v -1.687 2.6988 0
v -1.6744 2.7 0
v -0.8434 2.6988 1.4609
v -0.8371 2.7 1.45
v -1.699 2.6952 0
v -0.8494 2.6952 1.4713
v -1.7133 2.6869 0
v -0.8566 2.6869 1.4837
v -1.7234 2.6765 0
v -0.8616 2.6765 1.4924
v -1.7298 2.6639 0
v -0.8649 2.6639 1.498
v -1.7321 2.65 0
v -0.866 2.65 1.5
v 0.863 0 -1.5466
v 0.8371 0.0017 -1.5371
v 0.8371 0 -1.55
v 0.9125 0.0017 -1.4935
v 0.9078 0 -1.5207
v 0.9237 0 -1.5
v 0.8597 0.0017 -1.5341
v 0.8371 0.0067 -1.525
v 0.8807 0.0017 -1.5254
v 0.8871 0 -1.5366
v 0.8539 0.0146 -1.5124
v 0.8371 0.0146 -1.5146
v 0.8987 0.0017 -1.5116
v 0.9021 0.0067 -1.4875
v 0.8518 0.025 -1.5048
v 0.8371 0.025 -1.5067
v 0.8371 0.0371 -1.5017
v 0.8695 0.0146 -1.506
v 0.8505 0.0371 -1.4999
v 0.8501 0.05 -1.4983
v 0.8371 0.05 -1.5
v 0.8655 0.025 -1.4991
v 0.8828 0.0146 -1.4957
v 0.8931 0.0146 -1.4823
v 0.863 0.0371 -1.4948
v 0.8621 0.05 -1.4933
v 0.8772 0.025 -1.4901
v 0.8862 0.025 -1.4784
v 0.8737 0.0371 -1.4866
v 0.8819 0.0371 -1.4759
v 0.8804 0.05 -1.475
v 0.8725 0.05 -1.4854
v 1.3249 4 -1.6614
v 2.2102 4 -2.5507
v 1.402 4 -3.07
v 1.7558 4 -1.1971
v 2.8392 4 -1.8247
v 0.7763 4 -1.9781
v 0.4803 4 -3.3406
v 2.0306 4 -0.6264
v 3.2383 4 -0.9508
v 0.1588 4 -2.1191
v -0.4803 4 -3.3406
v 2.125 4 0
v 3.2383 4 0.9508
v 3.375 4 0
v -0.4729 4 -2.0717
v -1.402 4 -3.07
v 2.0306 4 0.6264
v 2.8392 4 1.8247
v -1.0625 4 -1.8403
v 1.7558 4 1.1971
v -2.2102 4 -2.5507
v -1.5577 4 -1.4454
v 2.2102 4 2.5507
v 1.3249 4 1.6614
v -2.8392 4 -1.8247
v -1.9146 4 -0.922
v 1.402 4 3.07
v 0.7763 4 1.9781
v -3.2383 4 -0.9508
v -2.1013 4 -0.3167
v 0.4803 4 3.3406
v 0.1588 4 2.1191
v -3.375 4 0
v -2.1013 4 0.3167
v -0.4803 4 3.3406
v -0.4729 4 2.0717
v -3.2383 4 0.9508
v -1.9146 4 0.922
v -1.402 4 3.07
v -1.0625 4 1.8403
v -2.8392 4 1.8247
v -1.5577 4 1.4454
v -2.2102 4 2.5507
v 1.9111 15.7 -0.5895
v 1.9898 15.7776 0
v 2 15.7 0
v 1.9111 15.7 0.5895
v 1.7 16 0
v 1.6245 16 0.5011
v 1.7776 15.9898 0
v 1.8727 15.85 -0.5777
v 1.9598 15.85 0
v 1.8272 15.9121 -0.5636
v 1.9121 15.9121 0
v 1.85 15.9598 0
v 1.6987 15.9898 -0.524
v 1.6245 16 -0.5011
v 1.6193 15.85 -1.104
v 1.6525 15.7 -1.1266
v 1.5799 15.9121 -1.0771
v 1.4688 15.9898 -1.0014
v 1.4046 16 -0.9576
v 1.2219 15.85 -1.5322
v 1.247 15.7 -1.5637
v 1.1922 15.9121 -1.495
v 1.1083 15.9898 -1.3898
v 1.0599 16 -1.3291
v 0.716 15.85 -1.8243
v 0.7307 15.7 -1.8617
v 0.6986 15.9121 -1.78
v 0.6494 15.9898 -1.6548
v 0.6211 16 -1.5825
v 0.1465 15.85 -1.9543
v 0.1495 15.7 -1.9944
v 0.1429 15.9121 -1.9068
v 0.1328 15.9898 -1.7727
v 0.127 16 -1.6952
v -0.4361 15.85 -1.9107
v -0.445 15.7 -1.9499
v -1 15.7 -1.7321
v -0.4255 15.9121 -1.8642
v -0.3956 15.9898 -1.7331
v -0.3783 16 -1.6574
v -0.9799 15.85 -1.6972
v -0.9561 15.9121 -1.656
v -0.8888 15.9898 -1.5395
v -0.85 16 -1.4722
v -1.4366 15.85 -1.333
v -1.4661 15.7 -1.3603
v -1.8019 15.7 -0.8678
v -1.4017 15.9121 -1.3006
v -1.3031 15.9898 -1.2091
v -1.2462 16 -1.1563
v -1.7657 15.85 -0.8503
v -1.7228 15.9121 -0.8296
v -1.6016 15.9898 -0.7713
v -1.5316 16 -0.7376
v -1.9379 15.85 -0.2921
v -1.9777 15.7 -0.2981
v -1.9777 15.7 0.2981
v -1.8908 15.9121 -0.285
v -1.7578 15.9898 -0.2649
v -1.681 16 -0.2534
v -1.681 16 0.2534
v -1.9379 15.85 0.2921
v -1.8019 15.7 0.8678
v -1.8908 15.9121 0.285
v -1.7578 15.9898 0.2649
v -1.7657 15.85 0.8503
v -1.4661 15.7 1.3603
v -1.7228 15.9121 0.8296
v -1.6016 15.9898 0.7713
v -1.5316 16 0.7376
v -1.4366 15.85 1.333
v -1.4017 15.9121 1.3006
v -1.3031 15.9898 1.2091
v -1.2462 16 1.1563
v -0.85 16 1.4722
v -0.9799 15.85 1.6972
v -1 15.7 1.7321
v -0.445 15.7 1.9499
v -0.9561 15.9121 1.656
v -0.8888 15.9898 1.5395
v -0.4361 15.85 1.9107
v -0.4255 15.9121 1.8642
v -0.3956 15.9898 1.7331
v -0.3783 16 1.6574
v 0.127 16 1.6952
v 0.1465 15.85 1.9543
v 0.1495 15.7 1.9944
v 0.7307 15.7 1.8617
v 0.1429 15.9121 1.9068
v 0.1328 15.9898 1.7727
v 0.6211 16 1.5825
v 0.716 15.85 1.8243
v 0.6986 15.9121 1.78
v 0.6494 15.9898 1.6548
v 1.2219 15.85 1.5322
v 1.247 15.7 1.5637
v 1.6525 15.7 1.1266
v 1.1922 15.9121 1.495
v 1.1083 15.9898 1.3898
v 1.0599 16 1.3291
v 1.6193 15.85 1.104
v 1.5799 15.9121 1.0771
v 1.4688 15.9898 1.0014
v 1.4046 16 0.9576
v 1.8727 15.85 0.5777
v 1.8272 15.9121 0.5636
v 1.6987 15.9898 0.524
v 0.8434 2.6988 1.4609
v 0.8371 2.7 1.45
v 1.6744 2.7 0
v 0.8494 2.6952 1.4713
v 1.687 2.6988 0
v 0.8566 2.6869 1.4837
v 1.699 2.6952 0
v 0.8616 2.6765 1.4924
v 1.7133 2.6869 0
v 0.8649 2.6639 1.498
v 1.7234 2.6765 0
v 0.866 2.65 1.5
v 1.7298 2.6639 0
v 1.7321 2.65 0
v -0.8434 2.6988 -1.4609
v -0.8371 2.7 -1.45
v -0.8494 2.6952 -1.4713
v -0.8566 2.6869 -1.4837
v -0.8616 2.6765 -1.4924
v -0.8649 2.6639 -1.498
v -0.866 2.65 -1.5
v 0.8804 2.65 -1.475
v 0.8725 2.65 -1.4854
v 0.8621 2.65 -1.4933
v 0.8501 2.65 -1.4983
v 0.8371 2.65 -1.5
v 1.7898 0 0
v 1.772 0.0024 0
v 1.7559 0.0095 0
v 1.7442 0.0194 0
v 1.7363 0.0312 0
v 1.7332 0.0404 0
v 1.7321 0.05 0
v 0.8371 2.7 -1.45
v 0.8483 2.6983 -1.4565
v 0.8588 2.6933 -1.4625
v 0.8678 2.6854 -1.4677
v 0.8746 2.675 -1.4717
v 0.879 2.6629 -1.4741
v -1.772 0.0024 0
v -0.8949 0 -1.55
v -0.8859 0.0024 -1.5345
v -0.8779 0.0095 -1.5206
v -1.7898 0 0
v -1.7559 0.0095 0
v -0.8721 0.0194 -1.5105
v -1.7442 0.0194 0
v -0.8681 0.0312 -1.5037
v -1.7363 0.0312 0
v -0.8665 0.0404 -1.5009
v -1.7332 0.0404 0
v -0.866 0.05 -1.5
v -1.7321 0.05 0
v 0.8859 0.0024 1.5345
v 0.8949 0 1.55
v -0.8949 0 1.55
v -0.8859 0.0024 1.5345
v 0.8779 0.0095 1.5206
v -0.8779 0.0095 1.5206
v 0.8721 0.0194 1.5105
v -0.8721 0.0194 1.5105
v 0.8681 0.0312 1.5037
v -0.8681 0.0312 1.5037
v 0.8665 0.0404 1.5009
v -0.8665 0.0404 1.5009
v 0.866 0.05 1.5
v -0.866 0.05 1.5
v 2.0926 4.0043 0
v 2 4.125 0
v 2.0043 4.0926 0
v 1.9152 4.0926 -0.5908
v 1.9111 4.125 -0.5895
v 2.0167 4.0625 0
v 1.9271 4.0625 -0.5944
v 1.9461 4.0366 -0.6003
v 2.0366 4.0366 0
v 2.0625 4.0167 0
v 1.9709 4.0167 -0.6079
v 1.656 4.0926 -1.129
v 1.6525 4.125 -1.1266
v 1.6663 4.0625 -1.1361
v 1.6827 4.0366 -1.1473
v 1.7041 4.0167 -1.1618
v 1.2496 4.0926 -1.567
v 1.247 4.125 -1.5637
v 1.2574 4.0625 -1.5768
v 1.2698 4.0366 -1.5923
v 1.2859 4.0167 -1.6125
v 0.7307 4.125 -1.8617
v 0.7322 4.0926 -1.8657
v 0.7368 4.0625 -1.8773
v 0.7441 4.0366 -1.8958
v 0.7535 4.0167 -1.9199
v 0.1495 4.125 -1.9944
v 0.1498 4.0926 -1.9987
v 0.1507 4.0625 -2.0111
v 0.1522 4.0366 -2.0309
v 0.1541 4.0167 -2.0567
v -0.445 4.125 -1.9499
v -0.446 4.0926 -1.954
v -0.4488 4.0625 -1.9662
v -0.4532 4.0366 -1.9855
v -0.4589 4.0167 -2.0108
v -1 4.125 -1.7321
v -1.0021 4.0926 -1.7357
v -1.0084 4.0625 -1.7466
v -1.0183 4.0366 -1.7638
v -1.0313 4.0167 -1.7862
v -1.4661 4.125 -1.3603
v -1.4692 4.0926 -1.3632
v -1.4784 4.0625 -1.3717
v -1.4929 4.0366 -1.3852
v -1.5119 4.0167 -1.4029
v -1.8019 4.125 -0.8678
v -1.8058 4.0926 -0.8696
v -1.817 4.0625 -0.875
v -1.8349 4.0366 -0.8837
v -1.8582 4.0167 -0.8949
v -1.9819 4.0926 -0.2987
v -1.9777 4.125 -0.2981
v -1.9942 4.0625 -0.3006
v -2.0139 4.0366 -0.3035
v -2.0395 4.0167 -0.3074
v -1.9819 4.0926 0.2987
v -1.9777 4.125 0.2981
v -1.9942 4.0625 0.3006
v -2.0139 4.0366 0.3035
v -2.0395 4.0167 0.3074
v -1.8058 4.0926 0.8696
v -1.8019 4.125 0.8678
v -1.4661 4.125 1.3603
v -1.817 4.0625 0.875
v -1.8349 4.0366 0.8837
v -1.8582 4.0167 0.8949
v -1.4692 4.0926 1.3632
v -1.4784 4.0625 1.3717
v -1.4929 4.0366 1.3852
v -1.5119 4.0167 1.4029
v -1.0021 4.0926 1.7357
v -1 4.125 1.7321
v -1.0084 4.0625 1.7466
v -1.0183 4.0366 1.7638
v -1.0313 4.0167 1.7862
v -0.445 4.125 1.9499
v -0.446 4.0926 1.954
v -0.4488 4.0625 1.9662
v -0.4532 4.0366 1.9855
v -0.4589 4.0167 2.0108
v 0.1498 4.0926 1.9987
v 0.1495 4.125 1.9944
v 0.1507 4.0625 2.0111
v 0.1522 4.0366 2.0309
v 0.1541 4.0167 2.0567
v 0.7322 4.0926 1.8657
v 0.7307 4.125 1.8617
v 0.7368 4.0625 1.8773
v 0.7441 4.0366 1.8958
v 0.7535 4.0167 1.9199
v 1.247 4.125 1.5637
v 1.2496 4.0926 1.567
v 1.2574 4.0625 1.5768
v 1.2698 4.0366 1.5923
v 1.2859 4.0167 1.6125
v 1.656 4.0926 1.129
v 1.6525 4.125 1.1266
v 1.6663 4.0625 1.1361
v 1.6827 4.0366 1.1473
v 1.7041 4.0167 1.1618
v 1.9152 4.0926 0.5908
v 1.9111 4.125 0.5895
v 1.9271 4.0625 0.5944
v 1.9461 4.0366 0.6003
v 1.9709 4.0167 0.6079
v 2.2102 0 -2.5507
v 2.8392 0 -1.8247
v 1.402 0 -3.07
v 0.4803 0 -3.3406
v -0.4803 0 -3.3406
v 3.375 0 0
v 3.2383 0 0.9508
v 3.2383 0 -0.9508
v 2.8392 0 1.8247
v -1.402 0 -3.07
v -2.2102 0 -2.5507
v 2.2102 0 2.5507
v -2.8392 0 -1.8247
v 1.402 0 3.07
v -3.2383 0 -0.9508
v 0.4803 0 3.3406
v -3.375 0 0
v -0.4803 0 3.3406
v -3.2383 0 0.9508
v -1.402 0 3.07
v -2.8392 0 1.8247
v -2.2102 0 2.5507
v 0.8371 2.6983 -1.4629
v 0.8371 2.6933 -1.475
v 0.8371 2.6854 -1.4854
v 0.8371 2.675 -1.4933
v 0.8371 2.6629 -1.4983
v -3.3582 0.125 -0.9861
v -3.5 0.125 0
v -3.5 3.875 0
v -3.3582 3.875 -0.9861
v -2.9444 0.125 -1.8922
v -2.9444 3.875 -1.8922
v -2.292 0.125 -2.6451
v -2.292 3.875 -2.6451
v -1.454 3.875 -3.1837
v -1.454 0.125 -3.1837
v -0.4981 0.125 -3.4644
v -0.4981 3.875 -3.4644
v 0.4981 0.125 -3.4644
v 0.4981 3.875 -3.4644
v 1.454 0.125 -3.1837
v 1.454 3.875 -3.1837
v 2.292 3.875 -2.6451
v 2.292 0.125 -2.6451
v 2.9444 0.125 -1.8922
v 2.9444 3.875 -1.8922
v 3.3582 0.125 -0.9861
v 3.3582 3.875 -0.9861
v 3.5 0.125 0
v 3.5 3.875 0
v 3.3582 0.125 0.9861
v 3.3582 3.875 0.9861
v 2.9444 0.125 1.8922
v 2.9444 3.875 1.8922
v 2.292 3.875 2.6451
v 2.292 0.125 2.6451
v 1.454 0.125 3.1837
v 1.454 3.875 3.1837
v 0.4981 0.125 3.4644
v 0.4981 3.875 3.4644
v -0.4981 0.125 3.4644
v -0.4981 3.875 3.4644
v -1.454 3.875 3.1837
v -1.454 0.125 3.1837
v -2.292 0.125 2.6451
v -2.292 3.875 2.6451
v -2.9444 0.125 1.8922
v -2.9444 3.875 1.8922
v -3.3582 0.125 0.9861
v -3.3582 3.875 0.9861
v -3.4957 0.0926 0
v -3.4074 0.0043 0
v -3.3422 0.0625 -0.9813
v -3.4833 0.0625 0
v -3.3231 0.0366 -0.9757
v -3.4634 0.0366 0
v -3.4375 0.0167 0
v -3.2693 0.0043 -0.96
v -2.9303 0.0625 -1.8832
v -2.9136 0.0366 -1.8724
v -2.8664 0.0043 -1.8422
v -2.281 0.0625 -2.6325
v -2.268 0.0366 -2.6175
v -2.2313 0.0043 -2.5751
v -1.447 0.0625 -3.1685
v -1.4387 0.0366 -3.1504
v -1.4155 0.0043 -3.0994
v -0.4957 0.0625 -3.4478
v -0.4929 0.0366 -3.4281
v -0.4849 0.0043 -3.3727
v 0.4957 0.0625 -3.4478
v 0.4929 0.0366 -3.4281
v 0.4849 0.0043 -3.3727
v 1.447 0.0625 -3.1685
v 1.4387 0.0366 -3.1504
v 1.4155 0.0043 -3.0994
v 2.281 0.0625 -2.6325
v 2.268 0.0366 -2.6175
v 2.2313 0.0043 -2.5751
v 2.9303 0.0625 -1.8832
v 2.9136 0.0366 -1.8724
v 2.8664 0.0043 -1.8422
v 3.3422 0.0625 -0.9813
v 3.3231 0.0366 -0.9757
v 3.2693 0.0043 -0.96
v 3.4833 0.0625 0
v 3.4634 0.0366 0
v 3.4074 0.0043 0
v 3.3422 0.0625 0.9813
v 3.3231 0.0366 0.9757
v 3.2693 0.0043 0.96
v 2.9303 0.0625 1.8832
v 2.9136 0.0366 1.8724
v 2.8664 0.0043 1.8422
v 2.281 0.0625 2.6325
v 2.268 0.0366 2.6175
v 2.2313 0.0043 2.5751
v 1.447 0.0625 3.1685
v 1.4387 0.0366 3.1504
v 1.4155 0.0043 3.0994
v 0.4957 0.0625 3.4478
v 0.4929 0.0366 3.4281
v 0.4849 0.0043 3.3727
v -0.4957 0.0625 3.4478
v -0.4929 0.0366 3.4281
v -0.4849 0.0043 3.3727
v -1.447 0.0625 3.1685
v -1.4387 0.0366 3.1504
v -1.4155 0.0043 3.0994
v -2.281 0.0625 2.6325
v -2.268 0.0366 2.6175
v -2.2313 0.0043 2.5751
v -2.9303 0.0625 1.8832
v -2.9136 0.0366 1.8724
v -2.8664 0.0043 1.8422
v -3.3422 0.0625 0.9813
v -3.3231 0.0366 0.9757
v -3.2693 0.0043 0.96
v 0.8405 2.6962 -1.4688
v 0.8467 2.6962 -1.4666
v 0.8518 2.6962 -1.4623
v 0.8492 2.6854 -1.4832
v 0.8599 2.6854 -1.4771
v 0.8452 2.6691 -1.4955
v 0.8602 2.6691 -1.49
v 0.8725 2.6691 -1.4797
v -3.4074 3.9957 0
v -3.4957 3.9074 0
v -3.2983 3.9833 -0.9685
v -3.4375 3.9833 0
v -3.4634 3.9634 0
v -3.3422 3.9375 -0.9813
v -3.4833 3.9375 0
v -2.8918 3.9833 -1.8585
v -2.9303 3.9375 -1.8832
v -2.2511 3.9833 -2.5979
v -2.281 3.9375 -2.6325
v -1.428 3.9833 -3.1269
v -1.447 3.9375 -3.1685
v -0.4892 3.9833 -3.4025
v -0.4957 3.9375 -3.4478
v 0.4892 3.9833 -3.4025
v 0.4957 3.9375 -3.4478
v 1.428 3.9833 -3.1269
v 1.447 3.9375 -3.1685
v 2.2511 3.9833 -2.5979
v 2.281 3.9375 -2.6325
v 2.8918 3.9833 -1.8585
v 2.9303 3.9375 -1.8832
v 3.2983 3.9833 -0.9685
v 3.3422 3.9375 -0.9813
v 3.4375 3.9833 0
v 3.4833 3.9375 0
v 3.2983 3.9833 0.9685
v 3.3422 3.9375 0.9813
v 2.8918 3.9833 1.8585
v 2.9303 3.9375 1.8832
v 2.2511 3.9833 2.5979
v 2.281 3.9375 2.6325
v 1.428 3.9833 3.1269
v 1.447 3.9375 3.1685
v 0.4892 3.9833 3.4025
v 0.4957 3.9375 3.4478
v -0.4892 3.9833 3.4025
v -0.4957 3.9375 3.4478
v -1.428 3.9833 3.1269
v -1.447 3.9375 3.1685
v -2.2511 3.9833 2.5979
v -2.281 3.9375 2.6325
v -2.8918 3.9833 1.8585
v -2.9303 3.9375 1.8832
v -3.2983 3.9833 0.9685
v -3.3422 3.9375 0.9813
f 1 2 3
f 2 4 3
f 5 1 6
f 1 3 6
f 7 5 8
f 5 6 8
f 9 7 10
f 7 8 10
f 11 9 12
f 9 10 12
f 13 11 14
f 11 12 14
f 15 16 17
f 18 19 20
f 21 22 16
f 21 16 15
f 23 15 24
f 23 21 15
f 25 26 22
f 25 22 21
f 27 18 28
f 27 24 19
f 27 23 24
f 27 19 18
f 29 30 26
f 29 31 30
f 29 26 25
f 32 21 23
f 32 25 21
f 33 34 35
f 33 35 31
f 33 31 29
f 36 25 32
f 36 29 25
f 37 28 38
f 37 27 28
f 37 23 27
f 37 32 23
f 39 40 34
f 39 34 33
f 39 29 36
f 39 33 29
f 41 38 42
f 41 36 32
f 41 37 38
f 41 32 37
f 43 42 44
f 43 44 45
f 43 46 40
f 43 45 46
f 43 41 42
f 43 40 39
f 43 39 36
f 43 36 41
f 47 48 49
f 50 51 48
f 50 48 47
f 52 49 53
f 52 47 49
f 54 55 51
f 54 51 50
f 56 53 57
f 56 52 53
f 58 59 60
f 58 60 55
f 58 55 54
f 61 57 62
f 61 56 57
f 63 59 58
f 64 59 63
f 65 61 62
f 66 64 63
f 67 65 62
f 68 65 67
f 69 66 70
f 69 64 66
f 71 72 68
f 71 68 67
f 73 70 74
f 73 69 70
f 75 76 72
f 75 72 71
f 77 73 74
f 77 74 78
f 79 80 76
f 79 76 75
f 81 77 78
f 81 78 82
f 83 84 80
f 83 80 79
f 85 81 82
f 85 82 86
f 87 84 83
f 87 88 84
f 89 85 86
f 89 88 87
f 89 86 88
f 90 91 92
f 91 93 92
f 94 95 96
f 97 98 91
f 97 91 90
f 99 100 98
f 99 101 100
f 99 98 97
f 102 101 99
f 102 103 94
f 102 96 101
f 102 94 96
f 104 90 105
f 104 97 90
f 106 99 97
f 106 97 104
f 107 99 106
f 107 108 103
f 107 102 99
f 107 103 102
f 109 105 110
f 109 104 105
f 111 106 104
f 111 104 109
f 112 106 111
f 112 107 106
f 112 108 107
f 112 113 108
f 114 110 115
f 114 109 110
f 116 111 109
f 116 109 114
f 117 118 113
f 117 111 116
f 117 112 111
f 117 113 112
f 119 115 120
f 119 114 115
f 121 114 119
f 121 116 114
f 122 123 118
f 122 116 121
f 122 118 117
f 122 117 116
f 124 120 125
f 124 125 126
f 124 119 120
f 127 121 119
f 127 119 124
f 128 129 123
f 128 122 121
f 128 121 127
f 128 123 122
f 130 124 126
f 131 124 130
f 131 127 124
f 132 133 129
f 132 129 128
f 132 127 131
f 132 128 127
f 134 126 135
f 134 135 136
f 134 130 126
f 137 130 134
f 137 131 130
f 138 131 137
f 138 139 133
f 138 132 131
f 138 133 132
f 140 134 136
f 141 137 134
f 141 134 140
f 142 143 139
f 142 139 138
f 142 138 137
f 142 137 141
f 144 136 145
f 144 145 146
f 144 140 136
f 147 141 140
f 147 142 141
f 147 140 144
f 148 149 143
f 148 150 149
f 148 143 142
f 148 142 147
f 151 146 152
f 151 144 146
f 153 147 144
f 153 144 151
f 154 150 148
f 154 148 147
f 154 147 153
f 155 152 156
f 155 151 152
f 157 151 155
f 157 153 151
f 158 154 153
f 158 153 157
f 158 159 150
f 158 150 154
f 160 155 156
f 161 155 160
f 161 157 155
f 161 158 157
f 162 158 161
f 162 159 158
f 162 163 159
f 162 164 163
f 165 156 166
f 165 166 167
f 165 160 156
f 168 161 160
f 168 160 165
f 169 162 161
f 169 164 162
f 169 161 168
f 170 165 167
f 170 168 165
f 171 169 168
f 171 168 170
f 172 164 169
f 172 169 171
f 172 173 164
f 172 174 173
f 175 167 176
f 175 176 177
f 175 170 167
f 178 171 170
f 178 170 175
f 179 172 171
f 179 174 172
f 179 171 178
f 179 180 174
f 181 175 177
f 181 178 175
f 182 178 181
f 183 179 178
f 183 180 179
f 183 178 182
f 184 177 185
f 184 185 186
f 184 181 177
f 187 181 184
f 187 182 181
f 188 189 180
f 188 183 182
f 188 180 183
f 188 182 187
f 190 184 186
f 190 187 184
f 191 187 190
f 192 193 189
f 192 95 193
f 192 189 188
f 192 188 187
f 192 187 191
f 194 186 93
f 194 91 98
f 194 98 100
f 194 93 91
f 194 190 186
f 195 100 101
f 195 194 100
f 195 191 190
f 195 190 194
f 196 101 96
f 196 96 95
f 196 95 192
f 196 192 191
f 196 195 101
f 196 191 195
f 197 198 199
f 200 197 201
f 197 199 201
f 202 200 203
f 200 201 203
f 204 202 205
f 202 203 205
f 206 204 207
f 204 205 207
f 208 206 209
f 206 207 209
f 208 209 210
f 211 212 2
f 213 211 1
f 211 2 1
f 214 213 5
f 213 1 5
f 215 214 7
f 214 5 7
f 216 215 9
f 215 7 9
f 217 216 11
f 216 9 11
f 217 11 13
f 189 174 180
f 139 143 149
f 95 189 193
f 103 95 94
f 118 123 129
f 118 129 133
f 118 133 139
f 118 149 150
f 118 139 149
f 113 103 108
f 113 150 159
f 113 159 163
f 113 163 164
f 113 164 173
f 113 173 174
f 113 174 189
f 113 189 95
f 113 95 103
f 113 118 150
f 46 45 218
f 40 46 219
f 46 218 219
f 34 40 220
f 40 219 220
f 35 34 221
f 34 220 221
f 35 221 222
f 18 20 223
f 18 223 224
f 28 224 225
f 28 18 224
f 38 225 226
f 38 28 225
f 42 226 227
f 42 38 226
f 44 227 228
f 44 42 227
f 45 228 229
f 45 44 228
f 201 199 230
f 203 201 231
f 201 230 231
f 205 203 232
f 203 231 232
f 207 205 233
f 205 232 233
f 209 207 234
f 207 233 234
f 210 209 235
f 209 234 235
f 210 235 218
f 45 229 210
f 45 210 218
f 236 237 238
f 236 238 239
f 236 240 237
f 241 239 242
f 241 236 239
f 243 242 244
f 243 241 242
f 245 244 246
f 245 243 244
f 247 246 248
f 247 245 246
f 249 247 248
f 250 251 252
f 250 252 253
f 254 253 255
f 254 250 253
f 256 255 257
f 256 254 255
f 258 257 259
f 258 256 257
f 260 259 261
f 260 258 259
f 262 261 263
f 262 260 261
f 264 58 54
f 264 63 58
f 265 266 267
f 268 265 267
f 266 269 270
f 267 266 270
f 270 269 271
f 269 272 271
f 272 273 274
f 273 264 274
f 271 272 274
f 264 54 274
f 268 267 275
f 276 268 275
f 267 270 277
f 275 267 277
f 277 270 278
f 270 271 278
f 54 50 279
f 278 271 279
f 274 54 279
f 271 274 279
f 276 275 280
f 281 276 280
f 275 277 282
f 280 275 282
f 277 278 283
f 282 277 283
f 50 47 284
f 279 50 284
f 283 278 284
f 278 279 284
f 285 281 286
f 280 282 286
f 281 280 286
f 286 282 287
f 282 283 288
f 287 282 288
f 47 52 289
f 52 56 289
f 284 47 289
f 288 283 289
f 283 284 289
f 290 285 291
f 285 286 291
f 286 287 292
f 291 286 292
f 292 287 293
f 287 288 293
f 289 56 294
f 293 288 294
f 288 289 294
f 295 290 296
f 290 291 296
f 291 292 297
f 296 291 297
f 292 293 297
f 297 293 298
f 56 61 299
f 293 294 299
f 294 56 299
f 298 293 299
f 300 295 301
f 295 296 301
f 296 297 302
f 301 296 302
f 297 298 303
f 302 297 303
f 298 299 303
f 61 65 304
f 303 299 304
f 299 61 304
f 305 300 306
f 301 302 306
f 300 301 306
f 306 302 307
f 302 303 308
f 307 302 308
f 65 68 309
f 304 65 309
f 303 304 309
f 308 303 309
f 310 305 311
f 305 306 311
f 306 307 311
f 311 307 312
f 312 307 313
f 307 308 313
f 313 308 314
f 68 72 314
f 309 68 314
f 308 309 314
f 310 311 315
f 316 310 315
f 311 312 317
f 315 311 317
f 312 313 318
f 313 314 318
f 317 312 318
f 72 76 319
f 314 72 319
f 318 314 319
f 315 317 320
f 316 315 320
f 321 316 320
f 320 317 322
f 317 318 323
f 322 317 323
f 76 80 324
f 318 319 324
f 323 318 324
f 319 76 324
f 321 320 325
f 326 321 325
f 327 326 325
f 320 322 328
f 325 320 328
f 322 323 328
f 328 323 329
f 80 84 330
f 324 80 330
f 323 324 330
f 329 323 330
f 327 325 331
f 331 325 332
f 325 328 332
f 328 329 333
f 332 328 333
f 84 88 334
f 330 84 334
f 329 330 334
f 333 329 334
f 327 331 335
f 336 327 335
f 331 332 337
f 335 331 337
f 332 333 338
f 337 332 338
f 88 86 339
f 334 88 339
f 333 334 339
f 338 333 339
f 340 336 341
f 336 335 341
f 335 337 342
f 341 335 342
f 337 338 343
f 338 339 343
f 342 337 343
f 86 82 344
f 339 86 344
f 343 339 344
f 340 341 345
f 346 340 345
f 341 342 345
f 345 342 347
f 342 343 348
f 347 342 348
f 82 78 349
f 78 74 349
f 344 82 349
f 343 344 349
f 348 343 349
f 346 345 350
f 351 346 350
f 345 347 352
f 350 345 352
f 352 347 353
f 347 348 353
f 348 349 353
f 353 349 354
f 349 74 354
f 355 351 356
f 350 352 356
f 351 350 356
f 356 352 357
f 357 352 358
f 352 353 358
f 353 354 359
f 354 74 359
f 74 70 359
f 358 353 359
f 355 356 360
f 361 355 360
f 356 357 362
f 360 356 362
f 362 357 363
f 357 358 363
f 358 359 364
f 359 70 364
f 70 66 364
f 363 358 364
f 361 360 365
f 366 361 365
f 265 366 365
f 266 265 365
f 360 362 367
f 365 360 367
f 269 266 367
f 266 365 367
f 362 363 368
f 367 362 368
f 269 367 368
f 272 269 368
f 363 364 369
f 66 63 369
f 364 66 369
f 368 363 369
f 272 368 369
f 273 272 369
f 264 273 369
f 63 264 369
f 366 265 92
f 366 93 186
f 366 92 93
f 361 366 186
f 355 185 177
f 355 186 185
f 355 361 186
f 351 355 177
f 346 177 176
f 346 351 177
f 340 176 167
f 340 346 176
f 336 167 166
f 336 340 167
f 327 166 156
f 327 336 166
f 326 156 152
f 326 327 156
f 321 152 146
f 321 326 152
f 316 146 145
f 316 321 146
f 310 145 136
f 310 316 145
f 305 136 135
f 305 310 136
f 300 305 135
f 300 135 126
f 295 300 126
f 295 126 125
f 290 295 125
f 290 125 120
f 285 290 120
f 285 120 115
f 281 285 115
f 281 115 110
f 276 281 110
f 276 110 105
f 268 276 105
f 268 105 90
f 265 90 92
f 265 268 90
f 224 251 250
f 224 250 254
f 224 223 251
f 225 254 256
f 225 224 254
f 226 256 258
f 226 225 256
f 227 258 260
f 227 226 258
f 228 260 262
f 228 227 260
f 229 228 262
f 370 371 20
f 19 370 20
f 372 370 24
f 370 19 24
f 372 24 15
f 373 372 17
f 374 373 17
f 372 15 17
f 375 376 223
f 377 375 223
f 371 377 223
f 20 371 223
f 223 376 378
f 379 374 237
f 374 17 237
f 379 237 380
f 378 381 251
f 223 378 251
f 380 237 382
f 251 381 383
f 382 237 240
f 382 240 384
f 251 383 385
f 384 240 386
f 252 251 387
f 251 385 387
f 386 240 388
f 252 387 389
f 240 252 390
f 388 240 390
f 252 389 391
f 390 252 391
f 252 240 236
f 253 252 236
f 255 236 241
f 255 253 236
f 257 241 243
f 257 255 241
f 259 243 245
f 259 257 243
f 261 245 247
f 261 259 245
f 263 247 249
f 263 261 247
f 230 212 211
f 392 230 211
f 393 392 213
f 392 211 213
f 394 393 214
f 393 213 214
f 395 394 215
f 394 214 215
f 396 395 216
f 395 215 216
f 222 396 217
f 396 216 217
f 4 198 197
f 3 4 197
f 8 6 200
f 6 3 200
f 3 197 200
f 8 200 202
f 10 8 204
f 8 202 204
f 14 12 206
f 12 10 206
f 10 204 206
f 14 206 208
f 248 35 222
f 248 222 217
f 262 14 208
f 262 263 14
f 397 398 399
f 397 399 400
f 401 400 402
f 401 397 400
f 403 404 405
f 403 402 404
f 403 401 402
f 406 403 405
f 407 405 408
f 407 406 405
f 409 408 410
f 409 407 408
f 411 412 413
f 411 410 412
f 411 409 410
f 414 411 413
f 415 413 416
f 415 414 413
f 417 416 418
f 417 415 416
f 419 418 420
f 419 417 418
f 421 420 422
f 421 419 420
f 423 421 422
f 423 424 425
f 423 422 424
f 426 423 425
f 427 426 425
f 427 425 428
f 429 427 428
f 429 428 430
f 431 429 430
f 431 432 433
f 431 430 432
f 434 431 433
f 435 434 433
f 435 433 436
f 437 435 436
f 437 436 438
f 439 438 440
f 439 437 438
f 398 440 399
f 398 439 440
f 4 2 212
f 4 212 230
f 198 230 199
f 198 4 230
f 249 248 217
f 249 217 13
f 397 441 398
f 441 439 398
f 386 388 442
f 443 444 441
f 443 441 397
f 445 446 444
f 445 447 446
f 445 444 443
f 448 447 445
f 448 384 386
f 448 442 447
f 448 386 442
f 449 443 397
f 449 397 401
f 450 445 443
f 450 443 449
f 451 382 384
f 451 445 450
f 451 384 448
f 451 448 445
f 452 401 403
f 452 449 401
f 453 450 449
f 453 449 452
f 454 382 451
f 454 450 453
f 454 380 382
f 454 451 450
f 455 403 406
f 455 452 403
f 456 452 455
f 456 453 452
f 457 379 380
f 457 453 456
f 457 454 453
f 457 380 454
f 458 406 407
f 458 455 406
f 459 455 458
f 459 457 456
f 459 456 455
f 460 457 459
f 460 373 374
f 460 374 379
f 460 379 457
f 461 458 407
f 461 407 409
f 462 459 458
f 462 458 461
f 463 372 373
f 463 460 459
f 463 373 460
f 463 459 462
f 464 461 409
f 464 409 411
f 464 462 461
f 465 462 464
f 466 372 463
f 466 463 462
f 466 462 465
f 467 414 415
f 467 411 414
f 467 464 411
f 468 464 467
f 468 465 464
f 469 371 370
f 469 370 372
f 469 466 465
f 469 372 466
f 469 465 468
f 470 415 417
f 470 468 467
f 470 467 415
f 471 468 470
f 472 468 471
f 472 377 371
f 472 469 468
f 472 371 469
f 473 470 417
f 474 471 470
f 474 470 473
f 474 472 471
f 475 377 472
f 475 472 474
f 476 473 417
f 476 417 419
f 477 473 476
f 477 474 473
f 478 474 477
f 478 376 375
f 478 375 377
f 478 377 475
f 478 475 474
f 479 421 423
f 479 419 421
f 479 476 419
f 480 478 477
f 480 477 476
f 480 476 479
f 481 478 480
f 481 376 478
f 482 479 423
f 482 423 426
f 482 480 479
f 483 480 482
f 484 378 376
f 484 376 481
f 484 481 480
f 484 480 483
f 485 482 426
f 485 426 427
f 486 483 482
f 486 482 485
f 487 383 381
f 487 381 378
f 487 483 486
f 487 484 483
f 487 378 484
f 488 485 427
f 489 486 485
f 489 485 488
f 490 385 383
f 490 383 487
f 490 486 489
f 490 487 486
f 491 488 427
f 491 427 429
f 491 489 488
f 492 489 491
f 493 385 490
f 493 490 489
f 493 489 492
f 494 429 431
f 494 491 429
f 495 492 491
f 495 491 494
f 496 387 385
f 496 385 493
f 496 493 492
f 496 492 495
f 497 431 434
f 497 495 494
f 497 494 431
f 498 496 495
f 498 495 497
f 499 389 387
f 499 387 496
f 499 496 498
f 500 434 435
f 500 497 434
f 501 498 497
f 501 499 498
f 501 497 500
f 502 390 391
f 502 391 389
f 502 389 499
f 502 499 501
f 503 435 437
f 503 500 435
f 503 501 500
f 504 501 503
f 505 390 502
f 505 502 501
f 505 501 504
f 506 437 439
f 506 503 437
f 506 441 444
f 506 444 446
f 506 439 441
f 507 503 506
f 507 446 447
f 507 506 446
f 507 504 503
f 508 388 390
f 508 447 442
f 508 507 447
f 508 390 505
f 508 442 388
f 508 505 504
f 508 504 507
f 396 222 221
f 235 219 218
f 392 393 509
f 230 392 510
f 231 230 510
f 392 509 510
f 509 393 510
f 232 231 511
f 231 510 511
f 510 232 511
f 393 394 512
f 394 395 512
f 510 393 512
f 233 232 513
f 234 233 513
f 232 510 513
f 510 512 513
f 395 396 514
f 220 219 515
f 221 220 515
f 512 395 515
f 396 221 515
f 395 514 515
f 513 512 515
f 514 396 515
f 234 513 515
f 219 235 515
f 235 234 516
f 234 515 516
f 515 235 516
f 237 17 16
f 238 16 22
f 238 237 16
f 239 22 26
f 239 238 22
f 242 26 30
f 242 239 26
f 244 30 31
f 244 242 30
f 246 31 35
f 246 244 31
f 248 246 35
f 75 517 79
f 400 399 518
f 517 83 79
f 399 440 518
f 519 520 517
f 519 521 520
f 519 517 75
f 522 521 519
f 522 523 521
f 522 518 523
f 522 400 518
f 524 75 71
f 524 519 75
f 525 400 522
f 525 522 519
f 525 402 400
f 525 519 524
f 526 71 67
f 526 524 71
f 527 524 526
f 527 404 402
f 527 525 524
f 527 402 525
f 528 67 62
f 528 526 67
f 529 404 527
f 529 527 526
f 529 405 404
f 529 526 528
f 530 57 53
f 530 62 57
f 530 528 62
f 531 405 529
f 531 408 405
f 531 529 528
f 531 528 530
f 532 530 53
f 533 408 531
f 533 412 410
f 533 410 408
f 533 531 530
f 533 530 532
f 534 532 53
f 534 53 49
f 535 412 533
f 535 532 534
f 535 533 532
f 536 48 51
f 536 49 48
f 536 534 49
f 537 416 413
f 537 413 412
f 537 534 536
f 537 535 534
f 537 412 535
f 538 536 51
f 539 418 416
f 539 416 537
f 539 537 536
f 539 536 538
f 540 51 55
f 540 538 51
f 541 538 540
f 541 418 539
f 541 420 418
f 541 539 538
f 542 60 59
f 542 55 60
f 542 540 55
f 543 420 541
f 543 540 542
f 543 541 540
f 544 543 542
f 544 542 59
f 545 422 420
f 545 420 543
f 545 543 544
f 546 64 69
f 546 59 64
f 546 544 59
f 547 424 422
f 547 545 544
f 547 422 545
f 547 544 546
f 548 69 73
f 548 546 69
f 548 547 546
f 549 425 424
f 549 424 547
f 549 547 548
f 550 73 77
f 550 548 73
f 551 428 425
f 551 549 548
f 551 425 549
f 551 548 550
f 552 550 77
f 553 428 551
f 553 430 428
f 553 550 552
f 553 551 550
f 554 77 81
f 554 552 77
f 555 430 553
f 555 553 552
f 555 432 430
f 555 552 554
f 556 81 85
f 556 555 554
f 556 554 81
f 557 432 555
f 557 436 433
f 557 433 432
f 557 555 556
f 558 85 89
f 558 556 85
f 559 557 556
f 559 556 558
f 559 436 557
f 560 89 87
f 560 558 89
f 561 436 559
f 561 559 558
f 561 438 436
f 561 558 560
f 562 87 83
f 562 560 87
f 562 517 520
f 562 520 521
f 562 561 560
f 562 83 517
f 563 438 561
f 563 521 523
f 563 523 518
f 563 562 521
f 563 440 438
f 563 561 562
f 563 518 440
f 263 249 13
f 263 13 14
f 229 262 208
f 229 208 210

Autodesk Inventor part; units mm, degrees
ref_plane "YZ Plane" through (0, 0, 0) normal (1, 0, 0) x (0, 1, 0)
ref_plane "XZ Plane" through (0, 0, 0) normal (0, 1, 0) x (-1, 0, 0)
ref_plane "XY Plane" through (0, 0, 0) normal (0, 0, 1) x (1, 0, 0)
sketch "Sketch1" plane through (0, 0, 0) normal (0, 1, 0) x (-1, 0, 0)
  circle A0 centre (0, 0) radius 3.5
  dimension "d0" = 7
extrude "Extrusion1" add sketch "Sketch1" along normal blind 4
sketch "Sketch2" plane through (0, 4, 0) normal (0, 1, 0) x (1, 0, 0)
  circle A0 centre (0, 0) radius 2
  dimension "d3" = 4
extrude "Extrusion2" add sketch "Sketch2" along normal blind 12
sketch "Sketch3" plane through (0, 0, 0) normal (0, -1, 0) x (1, 0, 0)
  line L0 (-1.7321, 0) -> (-0.866, 1.5)
  line L1 (-0.866, 1.5) -> (0.866, 1.5)
  line L2 (0.866, 1.5) -> (1.7321, 0)
  line L3 (1.7321, 0) -> (0.866, -1.5)
  line L4 (0.866, -1.5) -> (-0.866, -1.5)
  line L5 (-0.866, -1.5) -> (-1.7321, 0)
  point P0 (0, 0)
  point P1 (0, 0)
  dimension "d6" = 3
extrude "Extrusion3" cut sketch "Sketch3" against normal blind 2.7
thread "Thread1" size "M4x0.7" class "6g" standard "ISO Metric profile" length 24
fillet "Fillet1" radius 0.3 1 edges at (-2, 16, 0)
fillet "Fillet2" radius 0.125 3 edges at (-2, 4, 0) (3.5, 4, 0) (3.5, 0, 0)
fillet "Fillet3" radius 0.05 13 edges at (-1.299, 0, -0.75) (-1.299, 0, 0.75) (0, 0, 1.5) (1.299, 0, 0.75) (1.299, 0, -0.75) (0.866, 1.35, -1.5) (0, 0, -1.5) (-1.299, 2.7, -0.75) (-1.299, 2.7, 0.75) (0, 2.7, 1.5) (1.299, 2.7, 0.75) (1.299, 2.7, -0.75) (0, 2.7, -1.5)
properties part number "MM-MMount_to_Motor-Bolt"
